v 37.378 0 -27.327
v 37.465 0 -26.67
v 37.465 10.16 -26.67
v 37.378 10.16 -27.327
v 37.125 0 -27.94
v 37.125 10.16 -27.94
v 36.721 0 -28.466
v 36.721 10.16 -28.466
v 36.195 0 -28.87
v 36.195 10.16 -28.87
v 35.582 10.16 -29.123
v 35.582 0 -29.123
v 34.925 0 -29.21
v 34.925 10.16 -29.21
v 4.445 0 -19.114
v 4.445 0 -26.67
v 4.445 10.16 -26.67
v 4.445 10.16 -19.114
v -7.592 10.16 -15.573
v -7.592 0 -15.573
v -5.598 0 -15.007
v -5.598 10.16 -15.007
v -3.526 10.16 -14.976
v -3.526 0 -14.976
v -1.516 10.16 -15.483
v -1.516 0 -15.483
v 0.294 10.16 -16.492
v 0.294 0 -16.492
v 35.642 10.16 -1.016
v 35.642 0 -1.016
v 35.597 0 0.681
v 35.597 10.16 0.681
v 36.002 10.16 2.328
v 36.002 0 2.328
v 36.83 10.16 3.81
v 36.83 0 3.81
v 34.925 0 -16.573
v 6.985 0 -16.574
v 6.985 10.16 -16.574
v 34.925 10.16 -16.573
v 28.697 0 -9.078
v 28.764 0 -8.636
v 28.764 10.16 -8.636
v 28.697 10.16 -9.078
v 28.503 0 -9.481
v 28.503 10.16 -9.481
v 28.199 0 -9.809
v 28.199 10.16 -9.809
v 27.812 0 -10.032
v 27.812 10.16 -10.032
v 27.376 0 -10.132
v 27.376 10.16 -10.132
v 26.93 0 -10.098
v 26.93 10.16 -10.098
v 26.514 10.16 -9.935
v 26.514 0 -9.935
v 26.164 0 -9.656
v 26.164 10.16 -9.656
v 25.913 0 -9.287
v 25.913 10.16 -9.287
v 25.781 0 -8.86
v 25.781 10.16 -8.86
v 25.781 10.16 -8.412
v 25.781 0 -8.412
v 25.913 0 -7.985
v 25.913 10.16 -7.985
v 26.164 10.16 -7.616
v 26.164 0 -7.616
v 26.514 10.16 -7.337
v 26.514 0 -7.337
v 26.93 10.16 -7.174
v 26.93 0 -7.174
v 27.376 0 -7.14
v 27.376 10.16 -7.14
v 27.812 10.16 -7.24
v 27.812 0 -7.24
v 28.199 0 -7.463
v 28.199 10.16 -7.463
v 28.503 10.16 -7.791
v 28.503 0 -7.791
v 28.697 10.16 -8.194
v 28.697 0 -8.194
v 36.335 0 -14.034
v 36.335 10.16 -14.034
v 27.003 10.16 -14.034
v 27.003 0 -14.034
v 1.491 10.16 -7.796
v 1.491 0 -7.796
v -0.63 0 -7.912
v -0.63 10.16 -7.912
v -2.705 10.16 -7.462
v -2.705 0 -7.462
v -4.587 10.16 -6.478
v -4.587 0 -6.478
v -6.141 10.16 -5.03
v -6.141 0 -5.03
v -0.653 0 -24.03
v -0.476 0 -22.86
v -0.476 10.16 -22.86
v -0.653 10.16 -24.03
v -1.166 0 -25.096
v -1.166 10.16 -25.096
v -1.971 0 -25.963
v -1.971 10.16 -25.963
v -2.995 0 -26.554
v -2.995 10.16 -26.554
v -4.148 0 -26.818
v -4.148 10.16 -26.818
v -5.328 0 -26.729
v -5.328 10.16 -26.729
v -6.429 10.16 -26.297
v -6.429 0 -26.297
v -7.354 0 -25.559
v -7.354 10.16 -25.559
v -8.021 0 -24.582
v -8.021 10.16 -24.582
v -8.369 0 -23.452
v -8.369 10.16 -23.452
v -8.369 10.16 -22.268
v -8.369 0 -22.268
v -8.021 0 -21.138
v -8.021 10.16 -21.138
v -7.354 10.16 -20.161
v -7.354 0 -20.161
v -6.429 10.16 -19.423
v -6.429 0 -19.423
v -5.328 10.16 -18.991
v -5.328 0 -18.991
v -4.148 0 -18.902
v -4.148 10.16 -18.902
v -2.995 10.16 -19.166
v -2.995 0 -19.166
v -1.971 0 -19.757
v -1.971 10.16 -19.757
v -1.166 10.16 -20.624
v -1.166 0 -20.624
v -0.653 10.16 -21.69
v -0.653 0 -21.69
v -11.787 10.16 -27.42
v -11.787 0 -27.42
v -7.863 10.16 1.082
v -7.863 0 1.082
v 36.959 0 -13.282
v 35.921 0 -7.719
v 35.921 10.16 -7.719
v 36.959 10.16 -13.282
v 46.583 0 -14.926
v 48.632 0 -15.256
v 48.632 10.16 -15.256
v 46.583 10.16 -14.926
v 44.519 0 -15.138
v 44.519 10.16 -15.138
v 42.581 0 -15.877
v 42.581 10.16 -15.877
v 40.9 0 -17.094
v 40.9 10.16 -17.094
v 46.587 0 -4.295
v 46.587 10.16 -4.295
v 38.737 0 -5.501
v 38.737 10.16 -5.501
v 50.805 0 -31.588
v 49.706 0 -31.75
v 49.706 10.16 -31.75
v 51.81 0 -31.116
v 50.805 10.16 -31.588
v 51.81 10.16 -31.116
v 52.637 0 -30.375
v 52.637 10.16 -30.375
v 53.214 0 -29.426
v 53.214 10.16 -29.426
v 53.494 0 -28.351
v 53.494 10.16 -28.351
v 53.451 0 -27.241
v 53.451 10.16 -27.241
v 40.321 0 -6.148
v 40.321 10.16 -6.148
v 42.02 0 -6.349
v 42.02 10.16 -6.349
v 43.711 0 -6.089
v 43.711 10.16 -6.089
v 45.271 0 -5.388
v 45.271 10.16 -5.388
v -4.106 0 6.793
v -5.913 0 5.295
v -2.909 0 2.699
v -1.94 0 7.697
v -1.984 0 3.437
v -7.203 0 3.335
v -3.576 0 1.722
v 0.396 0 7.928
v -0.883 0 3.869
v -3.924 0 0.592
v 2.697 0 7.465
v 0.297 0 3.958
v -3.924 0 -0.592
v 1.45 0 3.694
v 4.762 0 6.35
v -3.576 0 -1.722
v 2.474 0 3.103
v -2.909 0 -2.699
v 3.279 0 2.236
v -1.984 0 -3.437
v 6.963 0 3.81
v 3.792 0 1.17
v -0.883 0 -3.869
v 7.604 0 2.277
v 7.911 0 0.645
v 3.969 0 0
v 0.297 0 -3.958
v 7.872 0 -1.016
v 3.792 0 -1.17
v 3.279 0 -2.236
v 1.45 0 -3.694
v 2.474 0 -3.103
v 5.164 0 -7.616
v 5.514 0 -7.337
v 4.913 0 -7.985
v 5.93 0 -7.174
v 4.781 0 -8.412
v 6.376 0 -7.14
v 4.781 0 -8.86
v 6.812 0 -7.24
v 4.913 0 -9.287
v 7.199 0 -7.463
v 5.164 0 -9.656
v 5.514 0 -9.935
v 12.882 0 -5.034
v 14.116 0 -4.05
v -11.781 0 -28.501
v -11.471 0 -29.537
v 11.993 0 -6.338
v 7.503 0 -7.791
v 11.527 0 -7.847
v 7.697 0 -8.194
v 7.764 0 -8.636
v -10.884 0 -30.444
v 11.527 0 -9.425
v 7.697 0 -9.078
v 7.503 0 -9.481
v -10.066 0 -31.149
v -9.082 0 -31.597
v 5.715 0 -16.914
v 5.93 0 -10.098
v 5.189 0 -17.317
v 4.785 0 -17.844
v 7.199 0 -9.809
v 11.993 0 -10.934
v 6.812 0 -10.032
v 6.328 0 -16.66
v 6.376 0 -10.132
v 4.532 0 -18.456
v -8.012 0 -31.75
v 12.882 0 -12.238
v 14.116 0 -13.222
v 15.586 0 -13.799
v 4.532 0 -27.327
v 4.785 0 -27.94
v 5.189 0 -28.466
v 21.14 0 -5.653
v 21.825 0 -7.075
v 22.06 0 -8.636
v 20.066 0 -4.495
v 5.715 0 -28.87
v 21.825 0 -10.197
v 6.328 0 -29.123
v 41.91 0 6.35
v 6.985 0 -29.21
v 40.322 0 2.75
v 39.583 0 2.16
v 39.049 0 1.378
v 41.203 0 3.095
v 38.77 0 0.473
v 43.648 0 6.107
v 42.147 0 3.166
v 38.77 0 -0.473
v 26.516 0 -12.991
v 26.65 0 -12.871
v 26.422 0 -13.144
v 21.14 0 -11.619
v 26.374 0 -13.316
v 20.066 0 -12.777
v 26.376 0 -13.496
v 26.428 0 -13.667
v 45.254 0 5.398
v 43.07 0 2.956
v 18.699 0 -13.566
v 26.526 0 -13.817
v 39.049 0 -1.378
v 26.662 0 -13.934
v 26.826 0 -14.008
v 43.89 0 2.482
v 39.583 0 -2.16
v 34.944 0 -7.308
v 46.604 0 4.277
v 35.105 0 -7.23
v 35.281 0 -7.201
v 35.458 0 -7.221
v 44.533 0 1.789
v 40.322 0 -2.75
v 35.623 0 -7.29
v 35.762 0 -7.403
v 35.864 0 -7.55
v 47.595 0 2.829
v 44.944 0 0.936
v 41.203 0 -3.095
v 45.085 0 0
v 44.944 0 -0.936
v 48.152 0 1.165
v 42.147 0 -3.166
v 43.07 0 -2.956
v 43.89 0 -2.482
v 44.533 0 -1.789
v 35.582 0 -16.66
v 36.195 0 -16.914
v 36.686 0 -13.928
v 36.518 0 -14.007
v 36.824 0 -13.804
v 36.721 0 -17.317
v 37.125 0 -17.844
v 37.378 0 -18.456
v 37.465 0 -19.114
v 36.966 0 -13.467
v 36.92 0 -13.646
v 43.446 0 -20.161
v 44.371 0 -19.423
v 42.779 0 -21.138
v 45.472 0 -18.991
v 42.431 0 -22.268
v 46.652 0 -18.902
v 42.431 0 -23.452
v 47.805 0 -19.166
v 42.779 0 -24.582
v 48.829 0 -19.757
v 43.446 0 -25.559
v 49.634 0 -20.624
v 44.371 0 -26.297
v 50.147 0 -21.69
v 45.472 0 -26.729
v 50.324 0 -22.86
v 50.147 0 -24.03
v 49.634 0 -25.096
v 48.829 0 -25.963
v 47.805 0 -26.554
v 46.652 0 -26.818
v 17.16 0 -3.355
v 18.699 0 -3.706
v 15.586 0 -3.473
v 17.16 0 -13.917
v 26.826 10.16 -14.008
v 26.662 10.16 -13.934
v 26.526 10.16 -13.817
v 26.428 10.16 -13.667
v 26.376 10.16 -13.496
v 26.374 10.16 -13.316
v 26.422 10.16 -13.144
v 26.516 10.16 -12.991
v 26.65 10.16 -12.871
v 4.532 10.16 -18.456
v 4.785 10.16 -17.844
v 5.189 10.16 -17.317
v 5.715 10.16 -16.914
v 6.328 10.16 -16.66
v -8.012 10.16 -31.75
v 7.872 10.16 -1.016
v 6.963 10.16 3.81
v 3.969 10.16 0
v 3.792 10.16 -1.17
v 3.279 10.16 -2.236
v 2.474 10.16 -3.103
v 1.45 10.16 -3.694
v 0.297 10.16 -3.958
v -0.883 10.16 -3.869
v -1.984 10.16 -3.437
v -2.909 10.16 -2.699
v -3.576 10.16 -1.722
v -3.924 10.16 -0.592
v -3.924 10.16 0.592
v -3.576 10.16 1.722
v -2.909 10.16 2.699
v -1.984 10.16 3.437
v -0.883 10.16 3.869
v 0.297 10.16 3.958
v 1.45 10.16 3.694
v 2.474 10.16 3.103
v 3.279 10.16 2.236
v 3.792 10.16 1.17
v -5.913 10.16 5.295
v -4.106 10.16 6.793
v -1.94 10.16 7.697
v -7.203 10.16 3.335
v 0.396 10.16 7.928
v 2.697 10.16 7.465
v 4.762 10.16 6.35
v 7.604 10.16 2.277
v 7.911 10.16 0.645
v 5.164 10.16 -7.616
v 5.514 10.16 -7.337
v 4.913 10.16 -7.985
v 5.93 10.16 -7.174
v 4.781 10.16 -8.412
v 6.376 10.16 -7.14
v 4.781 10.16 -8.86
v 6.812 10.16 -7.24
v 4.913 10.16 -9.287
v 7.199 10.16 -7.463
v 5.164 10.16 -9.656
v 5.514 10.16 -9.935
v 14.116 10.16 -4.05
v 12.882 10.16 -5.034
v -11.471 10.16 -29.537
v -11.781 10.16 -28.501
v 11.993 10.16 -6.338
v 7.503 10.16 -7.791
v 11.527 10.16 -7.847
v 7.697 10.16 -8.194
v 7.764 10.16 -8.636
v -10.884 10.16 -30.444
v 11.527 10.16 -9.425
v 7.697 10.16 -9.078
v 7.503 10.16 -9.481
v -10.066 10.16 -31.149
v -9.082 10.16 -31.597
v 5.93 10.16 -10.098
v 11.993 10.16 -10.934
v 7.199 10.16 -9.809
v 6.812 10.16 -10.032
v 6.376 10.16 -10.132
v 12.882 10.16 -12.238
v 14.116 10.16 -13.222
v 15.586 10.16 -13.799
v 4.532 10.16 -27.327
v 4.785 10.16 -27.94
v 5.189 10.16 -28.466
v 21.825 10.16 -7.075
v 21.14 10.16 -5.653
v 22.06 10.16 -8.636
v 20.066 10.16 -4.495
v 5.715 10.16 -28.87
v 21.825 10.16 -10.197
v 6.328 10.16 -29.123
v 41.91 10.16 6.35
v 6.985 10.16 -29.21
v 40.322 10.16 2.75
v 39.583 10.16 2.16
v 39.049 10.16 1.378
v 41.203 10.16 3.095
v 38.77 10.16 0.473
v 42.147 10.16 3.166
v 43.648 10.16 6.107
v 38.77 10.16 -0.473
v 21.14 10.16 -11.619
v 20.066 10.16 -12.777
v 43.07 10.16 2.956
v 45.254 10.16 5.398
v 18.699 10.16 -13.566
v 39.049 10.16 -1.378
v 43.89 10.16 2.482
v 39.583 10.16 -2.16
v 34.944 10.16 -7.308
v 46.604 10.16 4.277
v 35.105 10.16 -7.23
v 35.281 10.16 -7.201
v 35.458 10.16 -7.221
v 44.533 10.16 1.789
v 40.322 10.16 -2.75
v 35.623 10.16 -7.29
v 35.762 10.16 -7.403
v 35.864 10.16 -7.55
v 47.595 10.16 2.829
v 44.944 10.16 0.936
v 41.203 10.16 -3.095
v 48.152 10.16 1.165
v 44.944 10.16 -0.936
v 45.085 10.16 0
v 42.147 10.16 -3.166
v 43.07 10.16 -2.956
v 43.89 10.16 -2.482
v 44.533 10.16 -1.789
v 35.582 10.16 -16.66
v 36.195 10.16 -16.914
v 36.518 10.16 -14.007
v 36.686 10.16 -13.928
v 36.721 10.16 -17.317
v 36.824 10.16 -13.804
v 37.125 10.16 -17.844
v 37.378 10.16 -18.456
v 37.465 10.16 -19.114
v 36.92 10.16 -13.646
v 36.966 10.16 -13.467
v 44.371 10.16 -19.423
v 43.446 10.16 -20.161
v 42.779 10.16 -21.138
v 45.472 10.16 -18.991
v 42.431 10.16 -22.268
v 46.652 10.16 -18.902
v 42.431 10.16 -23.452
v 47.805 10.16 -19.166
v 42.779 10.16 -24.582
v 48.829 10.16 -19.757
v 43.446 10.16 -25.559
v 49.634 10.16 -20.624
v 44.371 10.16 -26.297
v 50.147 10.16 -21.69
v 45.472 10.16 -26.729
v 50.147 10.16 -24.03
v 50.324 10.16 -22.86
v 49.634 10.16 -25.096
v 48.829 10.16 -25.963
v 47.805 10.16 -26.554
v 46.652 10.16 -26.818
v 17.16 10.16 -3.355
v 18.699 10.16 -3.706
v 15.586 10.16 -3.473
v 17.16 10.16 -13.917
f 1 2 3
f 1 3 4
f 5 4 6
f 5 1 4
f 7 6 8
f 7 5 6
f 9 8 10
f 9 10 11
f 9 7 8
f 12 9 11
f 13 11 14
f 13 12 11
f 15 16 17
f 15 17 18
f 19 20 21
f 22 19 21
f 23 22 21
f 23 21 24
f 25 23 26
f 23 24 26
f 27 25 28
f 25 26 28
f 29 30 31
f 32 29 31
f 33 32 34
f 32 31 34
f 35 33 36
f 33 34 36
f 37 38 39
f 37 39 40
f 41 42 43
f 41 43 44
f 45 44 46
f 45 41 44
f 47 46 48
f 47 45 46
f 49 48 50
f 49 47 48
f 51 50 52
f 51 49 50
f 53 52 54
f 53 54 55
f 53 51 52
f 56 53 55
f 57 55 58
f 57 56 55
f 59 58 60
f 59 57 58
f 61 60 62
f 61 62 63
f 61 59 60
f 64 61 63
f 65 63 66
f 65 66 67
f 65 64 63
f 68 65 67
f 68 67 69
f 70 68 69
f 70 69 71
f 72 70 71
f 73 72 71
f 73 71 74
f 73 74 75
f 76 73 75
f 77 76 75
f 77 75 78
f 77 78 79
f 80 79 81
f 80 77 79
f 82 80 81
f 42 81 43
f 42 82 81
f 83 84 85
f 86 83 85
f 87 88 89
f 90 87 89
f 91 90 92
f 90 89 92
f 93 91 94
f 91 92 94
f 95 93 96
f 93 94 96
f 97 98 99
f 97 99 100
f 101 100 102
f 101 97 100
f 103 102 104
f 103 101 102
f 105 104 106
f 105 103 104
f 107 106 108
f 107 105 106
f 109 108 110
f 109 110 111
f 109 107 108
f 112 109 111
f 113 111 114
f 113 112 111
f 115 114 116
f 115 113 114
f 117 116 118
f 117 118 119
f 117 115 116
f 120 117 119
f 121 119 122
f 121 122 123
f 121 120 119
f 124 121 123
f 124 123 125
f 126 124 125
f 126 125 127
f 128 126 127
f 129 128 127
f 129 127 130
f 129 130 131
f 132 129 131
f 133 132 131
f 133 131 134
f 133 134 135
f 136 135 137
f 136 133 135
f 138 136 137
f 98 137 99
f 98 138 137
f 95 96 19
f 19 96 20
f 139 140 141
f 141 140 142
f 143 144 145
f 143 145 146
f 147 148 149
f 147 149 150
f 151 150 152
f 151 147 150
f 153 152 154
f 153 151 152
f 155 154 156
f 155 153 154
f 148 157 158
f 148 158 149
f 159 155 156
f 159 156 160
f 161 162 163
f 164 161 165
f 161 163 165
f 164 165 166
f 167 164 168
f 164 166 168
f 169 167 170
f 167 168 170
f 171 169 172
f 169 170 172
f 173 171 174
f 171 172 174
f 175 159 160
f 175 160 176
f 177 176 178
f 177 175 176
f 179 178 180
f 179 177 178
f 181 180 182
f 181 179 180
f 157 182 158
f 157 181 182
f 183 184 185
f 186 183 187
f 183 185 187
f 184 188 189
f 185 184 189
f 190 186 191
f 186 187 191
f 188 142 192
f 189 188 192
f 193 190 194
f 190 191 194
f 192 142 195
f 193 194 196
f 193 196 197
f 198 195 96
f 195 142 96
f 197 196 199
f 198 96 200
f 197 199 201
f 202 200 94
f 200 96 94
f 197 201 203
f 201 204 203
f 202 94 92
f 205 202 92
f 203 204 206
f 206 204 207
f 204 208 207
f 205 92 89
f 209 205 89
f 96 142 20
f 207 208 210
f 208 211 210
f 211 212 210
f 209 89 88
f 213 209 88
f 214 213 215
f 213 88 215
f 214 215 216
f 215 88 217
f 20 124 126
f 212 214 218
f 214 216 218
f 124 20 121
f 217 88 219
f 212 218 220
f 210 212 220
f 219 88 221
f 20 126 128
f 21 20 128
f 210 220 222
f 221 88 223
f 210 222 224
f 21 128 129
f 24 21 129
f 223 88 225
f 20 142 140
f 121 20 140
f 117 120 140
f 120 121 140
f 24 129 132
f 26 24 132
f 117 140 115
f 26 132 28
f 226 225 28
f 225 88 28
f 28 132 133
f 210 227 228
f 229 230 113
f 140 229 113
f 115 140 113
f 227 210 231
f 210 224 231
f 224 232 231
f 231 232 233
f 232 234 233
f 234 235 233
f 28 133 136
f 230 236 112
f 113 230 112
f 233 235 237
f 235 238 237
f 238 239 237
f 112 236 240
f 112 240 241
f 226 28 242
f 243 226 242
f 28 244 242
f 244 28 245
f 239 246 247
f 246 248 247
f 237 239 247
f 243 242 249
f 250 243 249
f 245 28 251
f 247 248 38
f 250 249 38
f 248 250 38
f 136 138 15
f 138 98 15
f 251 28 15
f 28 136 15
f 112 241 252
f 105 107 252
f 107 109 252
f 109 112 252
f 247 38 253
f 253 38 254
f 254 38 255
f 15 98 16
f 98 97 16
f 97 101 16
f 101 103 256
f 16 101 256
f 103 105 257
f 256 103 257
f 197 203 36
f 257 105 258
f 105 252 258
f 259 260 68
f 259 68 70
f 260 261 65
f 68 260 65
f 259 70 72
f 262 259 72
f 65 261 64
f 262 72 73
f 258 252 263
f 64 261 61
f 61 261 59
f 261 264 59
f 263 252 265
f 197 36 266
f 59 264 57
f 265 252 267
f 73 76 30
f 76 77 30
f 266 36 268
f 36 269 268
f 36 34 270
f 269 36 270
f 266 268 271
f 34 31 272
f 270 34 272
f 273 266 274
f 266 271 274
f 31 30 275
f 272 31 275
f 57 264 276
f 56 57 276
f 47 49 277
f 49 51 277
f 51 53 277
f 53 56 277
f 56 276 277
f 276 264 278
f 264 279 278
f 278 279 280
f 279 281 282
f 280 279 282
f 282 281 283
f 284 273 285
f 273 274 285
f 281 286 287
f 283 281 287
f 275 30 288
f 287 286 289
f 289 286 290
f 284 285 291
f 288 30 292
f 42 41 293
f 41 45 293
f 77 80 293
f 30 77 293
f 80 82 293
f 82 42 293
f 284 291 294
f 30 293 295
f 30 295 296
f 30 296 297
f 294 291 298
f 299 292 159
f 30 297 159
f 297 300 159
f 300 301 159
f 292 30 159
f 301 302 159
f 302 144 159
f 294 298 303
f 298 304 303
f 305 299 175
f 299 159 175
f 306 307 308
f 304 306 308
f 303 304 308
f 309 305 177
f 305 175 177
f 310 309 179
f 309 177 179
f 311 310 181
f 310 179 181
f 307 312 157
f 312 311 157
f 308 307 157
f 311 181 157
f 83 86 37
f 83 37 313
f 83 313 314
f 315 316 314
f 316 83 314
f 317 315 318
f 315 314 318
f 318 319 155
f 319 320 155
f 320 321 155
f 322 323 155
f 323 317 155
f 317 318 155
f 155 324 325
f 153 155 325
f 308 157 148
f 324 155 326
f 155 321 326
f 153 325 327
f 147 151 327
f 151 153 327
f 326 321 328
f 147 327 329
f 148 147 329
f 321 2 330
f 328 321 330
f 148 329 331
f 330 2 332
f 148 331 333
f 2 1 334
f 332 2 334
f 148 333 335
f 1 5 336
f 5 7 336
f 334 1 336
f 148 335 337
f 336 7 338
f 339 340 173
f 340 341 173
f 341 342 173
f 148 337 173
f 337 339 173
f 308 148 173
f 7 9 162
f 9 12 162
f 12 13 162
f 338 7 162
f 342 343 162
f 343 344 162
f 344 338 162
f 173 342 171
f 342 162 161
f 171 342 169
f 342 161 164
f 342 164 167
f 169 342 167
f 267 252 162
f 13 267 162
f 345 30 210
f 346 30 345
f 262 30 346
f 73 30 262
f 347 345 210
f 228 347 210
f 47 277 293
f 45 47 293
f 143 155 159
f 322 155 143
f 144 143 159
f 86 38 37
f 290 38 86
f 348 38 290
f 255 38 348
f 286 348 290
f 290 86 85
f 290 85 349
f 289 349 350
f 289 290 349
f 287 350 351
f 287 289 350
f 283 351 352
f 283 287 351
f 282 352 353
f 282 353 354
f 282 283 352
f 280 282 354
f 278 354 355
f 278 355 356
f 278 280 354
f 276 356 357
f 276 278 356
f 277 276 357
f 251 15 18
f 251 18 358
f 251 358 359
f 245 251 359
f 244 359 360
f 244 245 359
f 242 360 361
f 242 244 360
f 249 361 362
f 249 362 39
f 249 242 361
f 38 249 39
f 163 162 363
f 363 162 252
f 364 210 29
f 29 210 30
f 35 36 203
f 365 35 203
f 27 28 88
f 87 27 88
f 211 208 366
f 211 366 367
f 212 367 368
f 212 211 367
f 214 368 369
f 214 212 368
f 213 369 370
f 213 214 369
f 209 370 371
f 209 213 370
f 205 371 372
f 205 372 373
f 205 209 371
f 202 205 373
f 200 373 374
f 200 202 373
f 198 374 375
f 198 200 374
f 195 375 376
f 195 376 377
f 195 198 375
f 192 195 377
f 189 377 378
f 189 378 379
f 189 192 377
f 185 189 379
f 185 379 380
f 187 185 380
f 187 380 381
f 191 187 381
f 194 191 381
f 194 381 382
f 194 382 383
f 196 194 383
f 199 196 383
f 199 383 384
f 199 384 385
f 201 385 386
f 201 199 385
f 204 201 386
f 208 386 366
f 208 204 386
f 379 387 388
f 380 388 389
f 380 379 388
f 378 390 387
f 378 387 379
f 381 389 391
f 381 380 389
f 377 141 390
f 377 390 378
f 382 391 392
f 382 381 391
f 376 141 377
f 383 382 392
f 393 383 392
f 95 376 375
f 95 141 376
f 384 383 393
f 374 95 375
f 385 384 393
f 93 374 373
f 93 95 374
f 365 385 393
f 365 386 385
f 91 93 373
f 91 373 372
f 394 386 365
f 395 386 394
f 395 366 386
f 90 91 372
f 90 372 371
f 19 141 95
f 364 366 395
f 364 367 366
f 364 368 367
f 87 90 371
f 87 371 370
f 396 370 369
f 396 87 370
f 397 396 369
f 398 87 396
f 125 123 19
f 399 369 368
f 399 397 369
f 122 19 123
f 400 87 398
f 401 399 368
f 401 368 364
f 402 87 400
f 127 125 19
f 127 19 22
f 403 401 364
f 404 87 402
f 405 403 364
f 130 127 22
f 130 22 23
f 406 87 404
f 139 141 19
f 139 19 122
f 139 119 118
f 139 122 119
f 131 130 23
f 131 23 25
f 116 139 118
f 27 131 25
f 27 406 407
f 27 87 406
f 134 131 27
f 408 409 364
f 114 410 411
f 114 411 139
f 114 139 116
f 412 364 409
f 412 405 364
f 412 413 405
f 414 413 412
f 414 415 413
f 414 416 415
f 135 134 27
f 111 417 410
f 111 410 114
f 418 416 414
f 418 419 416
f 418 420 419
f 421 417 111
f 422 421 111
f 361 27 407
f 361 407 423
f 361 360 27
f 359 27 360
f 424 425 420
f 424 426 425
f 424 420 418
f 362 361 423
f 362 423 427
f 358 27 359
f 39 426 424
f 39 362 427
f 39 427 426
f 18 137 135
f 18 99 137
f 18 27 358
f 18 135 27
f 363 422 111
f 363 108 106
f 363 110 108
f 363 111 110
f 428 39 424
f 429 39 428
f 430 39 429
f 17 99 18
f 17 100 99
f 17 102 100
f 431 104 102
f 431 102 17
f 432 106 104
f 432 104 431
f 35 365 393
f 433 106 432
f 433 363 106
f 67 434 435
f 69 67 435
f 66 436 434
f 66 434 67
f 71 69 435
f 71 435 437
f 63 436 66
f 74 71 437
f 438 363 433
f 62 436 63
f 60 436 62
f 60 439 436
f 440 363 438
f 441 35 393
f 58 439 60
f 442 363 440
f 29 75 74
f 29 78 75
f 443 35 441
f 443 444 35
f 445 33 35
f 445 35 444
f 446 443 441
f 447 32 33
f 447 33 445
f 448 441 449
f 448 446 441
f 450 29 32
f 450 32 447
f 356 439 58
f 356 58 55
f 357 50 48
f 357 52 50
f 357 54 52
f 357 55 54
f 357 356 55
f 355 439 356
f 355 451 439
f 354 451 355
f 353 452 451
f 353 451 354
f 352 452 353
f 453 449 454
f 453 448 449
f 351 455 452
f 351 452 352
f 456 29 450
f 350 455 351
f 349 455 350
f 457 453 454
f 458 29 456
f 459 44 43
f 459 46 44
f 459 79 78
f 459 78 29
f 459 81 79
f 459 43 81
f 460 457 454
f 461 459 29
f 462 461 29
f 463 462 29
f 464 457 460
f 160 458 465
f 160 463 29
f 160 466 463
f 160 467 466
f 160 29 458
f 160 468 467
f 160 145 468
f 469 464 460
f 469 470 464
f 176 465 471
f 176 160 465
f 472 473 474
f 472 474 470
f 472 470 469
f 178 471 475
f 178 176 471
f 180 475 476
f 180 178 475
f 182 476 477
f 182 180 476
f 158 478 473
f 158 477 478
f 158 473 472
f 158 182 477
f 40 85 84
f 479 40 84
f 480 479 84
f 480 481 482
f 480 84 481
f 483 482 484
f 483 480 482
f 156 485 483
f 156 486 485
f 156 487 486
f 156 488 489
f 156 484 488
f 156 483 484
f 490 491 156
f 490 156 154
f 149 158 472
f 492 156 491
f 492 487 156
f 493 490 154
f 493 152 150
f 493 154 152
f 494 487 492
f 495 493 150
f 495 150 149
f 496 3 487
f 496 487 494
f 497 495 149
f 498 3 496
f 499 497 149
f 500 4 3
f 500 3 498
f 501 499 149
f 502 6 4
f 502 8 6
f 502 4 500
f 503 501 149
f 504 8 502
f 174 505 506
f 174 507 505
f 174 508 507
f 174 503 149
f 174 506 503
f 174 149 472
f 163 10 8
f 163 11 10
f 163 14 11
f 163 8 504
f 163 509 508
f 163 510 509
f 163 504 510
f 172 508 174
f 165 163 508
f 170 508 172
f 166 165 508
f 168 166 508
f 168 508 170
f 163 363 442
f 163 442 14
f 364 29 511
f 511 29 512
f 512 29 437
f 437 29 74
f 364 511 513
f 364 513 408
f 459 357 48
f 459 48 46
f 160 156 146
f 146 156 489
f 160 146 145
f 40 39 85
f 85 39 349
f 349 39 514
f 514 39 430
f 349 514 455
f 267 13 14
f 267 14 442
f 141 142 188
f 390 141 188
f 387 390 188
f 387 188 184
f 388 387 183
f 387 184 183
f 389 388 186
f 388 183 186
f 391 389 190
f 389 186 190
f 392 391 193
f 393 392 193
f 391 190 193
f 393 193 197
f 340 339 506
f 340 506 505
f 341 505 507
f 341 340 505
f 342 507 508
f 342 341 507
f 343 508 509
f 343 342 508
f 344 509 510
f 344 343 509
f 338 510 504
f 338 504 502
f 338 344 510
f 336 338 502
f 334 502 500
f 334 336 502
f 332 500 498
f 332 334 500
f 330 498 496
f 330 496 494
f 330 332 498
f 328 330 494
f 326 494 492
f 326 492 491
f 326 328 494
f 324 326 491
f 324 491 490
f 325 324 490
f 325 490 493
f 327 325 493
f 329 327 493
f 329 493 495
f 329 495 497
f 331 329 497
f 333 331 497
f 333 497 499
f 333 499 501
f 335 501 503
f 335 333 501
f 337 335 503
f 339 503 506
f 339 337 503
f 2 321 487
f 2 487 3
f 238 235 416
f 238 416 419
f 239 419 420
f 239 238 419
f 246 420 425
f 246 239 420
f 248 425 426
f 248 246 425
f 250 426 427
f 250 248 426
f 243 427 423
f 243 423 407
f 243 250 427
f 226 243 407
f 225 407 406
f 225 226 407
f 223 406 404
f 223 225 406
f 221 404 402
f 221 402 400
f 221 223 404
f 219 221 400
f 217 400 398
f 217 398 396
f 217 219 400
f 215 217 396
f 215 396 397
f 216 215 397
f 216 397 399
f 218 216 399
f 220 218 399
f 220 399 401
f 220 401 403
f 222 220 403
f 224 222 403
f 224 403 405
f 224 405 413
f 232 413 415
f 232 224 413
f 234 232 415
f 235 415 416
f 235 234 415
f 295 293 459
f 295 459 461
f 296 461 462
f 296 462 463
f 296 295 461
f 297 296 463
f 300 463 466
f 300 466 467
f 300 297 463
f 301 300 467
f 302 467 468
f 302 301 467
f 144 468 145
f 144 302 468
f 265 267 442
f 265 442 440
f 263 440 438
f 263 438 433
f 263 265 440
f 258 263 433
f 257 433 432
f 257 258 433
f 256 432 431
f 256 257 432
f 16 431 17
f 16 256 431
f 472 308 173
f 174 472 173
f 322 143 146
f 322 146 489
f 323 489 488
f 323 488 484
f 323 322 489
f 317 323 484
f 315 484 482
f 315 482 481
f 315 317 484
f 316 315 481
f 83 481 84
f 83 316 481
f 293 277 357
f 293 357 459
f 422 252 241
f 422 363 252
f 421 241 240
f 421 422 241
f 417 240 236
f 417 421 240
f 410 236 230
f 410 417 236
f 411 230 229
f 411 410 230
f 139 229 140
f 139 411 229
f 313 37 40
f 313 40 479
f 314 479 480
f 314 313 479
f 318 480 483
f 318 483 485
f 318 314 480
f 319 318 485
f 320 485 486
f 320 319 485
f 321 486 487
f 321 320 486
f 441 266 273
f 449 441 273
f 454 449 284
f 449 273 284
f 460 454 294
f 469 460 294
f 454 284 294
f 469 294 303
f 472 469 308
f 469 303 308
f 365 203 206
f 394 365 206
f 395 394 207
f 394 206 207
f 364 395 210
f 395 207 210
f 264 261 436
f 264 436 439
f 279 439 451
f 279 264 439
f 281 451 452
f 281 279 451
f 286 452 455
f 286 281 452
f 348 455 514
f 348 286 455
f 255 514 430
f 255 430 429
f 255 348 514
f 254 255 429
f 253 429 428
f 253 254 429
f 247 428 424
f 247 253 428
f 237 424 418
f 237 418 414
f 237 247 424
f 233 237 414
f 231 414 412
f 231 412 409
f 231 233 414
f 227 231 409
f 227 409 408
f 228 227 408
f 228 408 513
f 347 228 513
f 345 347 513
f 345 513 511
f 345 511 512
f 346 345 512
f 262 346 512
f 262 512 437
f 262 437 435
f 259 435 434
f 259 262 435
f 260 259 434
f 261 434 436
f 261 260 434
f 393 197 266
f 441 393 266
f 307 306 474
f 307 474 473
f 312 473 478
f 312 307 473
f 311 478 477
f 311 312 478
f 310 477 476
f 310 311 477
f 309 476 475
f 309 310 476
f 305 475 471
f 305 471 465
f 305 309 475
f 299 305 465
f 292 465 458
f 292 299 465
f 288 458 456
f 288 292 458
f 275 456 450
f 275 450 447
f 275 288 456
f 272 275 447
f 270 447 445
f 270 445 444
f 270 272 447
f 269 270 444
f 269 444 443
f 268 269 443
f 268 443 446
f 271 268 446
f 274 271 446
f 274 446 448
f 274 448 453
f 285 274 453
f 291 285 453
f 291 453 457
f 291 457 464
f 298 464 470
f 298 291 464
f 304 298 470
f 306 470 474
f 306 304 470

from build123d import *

# Parameters (mm, degrees)
SKETCH4_R           = 3.96875
SKETCH4_R_2         = 5.2959
SKETCH4_R_3         = 1.5
SKETCH4_R_4         = 3.175
BOSS_EXTRUDE2_DEPTH = 10.16
FILLET1_R           = 3.81


with BuildPart() as part:
    # Sketch4 → Boss-Extrude2 (new body)
    with BuildSketch(Plane(origin=(0, 0, 0), x_dir=(1, 0, 0), z_dir=(0, 1, 0))):
        with BuildLine():
            Line((54.2925, 31.75), (-12.3825, 31.75))
            Line((-12.3825, 31.75), (-7.863361559, -1.082336008))
            ThreePointArc((-7.863361559, -1.082336008), (-3.056289676, -7.325503373), (4.7625, -6.35))
            Line((4.7625, -6.35), (41.91, -6.35))
            ThreePointArc((41.91, -6.35), (45.967580476, -4.884520517), (48.152310263, -1.164501002))
            Line((48.152310263, -1.164501002), (54.2925, 31.75))
        make_face()
        Circle(SKETCH4_R, mode=Mode.SUBTRACT)
        with Locations((46.355, 22.86)):
            Circle(SKETCH4_R, mode=Mode.SUBTRACT)
        with Locations((-4.445, 22.86)):
            Circle(SKETCH4_R, mode=Mode.SUBTRACT)
        with Locations((16.764, 8.636)):
            Circle(SKETCH4_R_2, mode=Mode.SUBTRACT)
        with Locations((27.264, 8.636)):
            Circle(SKETCH4_R_3, mode=Mode.SUBTRACT)
        with Locations((6.264, 8.636)):
            Circle(SKETCH4_R_3, mode=Mode.SUBTRACT)
        with Locations((41.91, 0)):
            Circle(SKETCH4_R_4, mode=Mode.SUBTRACT)
        with BuildLine():
            Line((34.925, 29.21), (6.985, 29.21))
            ThreePointArc((6.985, 29.21), (5.188948776, 28.466051224), (4.445, 26.67))
            Line((4.445, 26.67), (4.445, 19.1135))
            ThreePointArc((4.445, 19.1135), (5.188948776, 17.317448776), (6.985, 16.5735))
            Line((6.985, 16.5735), (34.925, 16.5735))
            ThreePointArc((34.925, 16.5735), (36.721051224, 17.317448776), (37.465, 19.1135))
            Line((37.465, 19.1135), (37.465, 26.67))
            ThreePointArc((37.465, 26.67), (36.721051224, 28.466051224), (34.925, 29.21))
        make_face(mode=Mode.SUBTRACT)
        with BuildLine():
            Line((46.58698696, 4.295147609), (48.631735848, 15.256028661))
            ThreePointArc((48.631735848, 15.256028661), (44.519378774, 15.137668683), (40.900146495, 17.093850549))
            Line((40.900146495, 17.093850549), (38.737442476, 5.500670755))
            ThreePointArc((38.737442476, 5.500670755), (42.873923491, 6.276412312), (46.58698696, 4.295147609))
        make_face(mode=Mode.SUBTRACT)
        with BuildLine():
            Line((36.83, -3.81), (6.963318623, -3.81))
            ThreePointArc((6.963318623, -3.81), (7.800370345, -1.469057088), (7.872207457, 1.016))
            Line((7.872207457, 1.016), (35.641806959, 1.016))
            ThreePointArc((35.641806959, 1.016), (35.744131016, -1.518077625), (36.83, -3.81))
        make_face(mode=Mode.SUBTRACT)
        with BuildLine():
            Line((-6.14066773, 5.029523445), (-7.591897143, 15.572960504))
            ThreePointArc((-7.591897143, 15.572960504), (-3.525796009, 14.975903966), (0.293891225, 16.492361803))
            Line((0.293891225, 16.492361803), (1.490851578, 7.796234208))
            ThreePointArc((1.490851578, 7.796234208), (-2.705340953, 7.462240721), (-6.14066773, 5.029523445))
        make_face(mode=Mode.SUBTRACT)
        with BuildLine():
            Line((35.921478098, 7.718896983), (36.959282513, 13.2820499))
            ThreePointArc((36.959282513, 13.2820499), (36.823503538, 13.804258048), (36.335051487, 14.0335))
            Line((36.335051487, 14.0335), (27.003423807, 14.0335))
            ThreePointArc((27.003423807, 14.0335), (26.395931126, 13.583371961), (26.649696678, 12.871146117))
            Line((26.649696678, 12.871146117), (34.943519943, 7.307993201))
            ThreePointArc((34.943519943, 7.307993201), (35.543221805, 7.249922938), (35.921478098, 7.718896983))
        make_face(mode=Mode.SUBTRACT)
    extrude(amount=BOSS_EXTRUDE2_DEPTH)

    # Fillet1
    fillet1_edges = [part.edges().sort_by_distance(p)[0] for p in [
        (-12.3825, 5.08, -31.75),
        (54.2925, 5.08, -31.75),
    ]]
    fillet(fillet1_edges, radius=FILLET1_R)


solid = part.part
